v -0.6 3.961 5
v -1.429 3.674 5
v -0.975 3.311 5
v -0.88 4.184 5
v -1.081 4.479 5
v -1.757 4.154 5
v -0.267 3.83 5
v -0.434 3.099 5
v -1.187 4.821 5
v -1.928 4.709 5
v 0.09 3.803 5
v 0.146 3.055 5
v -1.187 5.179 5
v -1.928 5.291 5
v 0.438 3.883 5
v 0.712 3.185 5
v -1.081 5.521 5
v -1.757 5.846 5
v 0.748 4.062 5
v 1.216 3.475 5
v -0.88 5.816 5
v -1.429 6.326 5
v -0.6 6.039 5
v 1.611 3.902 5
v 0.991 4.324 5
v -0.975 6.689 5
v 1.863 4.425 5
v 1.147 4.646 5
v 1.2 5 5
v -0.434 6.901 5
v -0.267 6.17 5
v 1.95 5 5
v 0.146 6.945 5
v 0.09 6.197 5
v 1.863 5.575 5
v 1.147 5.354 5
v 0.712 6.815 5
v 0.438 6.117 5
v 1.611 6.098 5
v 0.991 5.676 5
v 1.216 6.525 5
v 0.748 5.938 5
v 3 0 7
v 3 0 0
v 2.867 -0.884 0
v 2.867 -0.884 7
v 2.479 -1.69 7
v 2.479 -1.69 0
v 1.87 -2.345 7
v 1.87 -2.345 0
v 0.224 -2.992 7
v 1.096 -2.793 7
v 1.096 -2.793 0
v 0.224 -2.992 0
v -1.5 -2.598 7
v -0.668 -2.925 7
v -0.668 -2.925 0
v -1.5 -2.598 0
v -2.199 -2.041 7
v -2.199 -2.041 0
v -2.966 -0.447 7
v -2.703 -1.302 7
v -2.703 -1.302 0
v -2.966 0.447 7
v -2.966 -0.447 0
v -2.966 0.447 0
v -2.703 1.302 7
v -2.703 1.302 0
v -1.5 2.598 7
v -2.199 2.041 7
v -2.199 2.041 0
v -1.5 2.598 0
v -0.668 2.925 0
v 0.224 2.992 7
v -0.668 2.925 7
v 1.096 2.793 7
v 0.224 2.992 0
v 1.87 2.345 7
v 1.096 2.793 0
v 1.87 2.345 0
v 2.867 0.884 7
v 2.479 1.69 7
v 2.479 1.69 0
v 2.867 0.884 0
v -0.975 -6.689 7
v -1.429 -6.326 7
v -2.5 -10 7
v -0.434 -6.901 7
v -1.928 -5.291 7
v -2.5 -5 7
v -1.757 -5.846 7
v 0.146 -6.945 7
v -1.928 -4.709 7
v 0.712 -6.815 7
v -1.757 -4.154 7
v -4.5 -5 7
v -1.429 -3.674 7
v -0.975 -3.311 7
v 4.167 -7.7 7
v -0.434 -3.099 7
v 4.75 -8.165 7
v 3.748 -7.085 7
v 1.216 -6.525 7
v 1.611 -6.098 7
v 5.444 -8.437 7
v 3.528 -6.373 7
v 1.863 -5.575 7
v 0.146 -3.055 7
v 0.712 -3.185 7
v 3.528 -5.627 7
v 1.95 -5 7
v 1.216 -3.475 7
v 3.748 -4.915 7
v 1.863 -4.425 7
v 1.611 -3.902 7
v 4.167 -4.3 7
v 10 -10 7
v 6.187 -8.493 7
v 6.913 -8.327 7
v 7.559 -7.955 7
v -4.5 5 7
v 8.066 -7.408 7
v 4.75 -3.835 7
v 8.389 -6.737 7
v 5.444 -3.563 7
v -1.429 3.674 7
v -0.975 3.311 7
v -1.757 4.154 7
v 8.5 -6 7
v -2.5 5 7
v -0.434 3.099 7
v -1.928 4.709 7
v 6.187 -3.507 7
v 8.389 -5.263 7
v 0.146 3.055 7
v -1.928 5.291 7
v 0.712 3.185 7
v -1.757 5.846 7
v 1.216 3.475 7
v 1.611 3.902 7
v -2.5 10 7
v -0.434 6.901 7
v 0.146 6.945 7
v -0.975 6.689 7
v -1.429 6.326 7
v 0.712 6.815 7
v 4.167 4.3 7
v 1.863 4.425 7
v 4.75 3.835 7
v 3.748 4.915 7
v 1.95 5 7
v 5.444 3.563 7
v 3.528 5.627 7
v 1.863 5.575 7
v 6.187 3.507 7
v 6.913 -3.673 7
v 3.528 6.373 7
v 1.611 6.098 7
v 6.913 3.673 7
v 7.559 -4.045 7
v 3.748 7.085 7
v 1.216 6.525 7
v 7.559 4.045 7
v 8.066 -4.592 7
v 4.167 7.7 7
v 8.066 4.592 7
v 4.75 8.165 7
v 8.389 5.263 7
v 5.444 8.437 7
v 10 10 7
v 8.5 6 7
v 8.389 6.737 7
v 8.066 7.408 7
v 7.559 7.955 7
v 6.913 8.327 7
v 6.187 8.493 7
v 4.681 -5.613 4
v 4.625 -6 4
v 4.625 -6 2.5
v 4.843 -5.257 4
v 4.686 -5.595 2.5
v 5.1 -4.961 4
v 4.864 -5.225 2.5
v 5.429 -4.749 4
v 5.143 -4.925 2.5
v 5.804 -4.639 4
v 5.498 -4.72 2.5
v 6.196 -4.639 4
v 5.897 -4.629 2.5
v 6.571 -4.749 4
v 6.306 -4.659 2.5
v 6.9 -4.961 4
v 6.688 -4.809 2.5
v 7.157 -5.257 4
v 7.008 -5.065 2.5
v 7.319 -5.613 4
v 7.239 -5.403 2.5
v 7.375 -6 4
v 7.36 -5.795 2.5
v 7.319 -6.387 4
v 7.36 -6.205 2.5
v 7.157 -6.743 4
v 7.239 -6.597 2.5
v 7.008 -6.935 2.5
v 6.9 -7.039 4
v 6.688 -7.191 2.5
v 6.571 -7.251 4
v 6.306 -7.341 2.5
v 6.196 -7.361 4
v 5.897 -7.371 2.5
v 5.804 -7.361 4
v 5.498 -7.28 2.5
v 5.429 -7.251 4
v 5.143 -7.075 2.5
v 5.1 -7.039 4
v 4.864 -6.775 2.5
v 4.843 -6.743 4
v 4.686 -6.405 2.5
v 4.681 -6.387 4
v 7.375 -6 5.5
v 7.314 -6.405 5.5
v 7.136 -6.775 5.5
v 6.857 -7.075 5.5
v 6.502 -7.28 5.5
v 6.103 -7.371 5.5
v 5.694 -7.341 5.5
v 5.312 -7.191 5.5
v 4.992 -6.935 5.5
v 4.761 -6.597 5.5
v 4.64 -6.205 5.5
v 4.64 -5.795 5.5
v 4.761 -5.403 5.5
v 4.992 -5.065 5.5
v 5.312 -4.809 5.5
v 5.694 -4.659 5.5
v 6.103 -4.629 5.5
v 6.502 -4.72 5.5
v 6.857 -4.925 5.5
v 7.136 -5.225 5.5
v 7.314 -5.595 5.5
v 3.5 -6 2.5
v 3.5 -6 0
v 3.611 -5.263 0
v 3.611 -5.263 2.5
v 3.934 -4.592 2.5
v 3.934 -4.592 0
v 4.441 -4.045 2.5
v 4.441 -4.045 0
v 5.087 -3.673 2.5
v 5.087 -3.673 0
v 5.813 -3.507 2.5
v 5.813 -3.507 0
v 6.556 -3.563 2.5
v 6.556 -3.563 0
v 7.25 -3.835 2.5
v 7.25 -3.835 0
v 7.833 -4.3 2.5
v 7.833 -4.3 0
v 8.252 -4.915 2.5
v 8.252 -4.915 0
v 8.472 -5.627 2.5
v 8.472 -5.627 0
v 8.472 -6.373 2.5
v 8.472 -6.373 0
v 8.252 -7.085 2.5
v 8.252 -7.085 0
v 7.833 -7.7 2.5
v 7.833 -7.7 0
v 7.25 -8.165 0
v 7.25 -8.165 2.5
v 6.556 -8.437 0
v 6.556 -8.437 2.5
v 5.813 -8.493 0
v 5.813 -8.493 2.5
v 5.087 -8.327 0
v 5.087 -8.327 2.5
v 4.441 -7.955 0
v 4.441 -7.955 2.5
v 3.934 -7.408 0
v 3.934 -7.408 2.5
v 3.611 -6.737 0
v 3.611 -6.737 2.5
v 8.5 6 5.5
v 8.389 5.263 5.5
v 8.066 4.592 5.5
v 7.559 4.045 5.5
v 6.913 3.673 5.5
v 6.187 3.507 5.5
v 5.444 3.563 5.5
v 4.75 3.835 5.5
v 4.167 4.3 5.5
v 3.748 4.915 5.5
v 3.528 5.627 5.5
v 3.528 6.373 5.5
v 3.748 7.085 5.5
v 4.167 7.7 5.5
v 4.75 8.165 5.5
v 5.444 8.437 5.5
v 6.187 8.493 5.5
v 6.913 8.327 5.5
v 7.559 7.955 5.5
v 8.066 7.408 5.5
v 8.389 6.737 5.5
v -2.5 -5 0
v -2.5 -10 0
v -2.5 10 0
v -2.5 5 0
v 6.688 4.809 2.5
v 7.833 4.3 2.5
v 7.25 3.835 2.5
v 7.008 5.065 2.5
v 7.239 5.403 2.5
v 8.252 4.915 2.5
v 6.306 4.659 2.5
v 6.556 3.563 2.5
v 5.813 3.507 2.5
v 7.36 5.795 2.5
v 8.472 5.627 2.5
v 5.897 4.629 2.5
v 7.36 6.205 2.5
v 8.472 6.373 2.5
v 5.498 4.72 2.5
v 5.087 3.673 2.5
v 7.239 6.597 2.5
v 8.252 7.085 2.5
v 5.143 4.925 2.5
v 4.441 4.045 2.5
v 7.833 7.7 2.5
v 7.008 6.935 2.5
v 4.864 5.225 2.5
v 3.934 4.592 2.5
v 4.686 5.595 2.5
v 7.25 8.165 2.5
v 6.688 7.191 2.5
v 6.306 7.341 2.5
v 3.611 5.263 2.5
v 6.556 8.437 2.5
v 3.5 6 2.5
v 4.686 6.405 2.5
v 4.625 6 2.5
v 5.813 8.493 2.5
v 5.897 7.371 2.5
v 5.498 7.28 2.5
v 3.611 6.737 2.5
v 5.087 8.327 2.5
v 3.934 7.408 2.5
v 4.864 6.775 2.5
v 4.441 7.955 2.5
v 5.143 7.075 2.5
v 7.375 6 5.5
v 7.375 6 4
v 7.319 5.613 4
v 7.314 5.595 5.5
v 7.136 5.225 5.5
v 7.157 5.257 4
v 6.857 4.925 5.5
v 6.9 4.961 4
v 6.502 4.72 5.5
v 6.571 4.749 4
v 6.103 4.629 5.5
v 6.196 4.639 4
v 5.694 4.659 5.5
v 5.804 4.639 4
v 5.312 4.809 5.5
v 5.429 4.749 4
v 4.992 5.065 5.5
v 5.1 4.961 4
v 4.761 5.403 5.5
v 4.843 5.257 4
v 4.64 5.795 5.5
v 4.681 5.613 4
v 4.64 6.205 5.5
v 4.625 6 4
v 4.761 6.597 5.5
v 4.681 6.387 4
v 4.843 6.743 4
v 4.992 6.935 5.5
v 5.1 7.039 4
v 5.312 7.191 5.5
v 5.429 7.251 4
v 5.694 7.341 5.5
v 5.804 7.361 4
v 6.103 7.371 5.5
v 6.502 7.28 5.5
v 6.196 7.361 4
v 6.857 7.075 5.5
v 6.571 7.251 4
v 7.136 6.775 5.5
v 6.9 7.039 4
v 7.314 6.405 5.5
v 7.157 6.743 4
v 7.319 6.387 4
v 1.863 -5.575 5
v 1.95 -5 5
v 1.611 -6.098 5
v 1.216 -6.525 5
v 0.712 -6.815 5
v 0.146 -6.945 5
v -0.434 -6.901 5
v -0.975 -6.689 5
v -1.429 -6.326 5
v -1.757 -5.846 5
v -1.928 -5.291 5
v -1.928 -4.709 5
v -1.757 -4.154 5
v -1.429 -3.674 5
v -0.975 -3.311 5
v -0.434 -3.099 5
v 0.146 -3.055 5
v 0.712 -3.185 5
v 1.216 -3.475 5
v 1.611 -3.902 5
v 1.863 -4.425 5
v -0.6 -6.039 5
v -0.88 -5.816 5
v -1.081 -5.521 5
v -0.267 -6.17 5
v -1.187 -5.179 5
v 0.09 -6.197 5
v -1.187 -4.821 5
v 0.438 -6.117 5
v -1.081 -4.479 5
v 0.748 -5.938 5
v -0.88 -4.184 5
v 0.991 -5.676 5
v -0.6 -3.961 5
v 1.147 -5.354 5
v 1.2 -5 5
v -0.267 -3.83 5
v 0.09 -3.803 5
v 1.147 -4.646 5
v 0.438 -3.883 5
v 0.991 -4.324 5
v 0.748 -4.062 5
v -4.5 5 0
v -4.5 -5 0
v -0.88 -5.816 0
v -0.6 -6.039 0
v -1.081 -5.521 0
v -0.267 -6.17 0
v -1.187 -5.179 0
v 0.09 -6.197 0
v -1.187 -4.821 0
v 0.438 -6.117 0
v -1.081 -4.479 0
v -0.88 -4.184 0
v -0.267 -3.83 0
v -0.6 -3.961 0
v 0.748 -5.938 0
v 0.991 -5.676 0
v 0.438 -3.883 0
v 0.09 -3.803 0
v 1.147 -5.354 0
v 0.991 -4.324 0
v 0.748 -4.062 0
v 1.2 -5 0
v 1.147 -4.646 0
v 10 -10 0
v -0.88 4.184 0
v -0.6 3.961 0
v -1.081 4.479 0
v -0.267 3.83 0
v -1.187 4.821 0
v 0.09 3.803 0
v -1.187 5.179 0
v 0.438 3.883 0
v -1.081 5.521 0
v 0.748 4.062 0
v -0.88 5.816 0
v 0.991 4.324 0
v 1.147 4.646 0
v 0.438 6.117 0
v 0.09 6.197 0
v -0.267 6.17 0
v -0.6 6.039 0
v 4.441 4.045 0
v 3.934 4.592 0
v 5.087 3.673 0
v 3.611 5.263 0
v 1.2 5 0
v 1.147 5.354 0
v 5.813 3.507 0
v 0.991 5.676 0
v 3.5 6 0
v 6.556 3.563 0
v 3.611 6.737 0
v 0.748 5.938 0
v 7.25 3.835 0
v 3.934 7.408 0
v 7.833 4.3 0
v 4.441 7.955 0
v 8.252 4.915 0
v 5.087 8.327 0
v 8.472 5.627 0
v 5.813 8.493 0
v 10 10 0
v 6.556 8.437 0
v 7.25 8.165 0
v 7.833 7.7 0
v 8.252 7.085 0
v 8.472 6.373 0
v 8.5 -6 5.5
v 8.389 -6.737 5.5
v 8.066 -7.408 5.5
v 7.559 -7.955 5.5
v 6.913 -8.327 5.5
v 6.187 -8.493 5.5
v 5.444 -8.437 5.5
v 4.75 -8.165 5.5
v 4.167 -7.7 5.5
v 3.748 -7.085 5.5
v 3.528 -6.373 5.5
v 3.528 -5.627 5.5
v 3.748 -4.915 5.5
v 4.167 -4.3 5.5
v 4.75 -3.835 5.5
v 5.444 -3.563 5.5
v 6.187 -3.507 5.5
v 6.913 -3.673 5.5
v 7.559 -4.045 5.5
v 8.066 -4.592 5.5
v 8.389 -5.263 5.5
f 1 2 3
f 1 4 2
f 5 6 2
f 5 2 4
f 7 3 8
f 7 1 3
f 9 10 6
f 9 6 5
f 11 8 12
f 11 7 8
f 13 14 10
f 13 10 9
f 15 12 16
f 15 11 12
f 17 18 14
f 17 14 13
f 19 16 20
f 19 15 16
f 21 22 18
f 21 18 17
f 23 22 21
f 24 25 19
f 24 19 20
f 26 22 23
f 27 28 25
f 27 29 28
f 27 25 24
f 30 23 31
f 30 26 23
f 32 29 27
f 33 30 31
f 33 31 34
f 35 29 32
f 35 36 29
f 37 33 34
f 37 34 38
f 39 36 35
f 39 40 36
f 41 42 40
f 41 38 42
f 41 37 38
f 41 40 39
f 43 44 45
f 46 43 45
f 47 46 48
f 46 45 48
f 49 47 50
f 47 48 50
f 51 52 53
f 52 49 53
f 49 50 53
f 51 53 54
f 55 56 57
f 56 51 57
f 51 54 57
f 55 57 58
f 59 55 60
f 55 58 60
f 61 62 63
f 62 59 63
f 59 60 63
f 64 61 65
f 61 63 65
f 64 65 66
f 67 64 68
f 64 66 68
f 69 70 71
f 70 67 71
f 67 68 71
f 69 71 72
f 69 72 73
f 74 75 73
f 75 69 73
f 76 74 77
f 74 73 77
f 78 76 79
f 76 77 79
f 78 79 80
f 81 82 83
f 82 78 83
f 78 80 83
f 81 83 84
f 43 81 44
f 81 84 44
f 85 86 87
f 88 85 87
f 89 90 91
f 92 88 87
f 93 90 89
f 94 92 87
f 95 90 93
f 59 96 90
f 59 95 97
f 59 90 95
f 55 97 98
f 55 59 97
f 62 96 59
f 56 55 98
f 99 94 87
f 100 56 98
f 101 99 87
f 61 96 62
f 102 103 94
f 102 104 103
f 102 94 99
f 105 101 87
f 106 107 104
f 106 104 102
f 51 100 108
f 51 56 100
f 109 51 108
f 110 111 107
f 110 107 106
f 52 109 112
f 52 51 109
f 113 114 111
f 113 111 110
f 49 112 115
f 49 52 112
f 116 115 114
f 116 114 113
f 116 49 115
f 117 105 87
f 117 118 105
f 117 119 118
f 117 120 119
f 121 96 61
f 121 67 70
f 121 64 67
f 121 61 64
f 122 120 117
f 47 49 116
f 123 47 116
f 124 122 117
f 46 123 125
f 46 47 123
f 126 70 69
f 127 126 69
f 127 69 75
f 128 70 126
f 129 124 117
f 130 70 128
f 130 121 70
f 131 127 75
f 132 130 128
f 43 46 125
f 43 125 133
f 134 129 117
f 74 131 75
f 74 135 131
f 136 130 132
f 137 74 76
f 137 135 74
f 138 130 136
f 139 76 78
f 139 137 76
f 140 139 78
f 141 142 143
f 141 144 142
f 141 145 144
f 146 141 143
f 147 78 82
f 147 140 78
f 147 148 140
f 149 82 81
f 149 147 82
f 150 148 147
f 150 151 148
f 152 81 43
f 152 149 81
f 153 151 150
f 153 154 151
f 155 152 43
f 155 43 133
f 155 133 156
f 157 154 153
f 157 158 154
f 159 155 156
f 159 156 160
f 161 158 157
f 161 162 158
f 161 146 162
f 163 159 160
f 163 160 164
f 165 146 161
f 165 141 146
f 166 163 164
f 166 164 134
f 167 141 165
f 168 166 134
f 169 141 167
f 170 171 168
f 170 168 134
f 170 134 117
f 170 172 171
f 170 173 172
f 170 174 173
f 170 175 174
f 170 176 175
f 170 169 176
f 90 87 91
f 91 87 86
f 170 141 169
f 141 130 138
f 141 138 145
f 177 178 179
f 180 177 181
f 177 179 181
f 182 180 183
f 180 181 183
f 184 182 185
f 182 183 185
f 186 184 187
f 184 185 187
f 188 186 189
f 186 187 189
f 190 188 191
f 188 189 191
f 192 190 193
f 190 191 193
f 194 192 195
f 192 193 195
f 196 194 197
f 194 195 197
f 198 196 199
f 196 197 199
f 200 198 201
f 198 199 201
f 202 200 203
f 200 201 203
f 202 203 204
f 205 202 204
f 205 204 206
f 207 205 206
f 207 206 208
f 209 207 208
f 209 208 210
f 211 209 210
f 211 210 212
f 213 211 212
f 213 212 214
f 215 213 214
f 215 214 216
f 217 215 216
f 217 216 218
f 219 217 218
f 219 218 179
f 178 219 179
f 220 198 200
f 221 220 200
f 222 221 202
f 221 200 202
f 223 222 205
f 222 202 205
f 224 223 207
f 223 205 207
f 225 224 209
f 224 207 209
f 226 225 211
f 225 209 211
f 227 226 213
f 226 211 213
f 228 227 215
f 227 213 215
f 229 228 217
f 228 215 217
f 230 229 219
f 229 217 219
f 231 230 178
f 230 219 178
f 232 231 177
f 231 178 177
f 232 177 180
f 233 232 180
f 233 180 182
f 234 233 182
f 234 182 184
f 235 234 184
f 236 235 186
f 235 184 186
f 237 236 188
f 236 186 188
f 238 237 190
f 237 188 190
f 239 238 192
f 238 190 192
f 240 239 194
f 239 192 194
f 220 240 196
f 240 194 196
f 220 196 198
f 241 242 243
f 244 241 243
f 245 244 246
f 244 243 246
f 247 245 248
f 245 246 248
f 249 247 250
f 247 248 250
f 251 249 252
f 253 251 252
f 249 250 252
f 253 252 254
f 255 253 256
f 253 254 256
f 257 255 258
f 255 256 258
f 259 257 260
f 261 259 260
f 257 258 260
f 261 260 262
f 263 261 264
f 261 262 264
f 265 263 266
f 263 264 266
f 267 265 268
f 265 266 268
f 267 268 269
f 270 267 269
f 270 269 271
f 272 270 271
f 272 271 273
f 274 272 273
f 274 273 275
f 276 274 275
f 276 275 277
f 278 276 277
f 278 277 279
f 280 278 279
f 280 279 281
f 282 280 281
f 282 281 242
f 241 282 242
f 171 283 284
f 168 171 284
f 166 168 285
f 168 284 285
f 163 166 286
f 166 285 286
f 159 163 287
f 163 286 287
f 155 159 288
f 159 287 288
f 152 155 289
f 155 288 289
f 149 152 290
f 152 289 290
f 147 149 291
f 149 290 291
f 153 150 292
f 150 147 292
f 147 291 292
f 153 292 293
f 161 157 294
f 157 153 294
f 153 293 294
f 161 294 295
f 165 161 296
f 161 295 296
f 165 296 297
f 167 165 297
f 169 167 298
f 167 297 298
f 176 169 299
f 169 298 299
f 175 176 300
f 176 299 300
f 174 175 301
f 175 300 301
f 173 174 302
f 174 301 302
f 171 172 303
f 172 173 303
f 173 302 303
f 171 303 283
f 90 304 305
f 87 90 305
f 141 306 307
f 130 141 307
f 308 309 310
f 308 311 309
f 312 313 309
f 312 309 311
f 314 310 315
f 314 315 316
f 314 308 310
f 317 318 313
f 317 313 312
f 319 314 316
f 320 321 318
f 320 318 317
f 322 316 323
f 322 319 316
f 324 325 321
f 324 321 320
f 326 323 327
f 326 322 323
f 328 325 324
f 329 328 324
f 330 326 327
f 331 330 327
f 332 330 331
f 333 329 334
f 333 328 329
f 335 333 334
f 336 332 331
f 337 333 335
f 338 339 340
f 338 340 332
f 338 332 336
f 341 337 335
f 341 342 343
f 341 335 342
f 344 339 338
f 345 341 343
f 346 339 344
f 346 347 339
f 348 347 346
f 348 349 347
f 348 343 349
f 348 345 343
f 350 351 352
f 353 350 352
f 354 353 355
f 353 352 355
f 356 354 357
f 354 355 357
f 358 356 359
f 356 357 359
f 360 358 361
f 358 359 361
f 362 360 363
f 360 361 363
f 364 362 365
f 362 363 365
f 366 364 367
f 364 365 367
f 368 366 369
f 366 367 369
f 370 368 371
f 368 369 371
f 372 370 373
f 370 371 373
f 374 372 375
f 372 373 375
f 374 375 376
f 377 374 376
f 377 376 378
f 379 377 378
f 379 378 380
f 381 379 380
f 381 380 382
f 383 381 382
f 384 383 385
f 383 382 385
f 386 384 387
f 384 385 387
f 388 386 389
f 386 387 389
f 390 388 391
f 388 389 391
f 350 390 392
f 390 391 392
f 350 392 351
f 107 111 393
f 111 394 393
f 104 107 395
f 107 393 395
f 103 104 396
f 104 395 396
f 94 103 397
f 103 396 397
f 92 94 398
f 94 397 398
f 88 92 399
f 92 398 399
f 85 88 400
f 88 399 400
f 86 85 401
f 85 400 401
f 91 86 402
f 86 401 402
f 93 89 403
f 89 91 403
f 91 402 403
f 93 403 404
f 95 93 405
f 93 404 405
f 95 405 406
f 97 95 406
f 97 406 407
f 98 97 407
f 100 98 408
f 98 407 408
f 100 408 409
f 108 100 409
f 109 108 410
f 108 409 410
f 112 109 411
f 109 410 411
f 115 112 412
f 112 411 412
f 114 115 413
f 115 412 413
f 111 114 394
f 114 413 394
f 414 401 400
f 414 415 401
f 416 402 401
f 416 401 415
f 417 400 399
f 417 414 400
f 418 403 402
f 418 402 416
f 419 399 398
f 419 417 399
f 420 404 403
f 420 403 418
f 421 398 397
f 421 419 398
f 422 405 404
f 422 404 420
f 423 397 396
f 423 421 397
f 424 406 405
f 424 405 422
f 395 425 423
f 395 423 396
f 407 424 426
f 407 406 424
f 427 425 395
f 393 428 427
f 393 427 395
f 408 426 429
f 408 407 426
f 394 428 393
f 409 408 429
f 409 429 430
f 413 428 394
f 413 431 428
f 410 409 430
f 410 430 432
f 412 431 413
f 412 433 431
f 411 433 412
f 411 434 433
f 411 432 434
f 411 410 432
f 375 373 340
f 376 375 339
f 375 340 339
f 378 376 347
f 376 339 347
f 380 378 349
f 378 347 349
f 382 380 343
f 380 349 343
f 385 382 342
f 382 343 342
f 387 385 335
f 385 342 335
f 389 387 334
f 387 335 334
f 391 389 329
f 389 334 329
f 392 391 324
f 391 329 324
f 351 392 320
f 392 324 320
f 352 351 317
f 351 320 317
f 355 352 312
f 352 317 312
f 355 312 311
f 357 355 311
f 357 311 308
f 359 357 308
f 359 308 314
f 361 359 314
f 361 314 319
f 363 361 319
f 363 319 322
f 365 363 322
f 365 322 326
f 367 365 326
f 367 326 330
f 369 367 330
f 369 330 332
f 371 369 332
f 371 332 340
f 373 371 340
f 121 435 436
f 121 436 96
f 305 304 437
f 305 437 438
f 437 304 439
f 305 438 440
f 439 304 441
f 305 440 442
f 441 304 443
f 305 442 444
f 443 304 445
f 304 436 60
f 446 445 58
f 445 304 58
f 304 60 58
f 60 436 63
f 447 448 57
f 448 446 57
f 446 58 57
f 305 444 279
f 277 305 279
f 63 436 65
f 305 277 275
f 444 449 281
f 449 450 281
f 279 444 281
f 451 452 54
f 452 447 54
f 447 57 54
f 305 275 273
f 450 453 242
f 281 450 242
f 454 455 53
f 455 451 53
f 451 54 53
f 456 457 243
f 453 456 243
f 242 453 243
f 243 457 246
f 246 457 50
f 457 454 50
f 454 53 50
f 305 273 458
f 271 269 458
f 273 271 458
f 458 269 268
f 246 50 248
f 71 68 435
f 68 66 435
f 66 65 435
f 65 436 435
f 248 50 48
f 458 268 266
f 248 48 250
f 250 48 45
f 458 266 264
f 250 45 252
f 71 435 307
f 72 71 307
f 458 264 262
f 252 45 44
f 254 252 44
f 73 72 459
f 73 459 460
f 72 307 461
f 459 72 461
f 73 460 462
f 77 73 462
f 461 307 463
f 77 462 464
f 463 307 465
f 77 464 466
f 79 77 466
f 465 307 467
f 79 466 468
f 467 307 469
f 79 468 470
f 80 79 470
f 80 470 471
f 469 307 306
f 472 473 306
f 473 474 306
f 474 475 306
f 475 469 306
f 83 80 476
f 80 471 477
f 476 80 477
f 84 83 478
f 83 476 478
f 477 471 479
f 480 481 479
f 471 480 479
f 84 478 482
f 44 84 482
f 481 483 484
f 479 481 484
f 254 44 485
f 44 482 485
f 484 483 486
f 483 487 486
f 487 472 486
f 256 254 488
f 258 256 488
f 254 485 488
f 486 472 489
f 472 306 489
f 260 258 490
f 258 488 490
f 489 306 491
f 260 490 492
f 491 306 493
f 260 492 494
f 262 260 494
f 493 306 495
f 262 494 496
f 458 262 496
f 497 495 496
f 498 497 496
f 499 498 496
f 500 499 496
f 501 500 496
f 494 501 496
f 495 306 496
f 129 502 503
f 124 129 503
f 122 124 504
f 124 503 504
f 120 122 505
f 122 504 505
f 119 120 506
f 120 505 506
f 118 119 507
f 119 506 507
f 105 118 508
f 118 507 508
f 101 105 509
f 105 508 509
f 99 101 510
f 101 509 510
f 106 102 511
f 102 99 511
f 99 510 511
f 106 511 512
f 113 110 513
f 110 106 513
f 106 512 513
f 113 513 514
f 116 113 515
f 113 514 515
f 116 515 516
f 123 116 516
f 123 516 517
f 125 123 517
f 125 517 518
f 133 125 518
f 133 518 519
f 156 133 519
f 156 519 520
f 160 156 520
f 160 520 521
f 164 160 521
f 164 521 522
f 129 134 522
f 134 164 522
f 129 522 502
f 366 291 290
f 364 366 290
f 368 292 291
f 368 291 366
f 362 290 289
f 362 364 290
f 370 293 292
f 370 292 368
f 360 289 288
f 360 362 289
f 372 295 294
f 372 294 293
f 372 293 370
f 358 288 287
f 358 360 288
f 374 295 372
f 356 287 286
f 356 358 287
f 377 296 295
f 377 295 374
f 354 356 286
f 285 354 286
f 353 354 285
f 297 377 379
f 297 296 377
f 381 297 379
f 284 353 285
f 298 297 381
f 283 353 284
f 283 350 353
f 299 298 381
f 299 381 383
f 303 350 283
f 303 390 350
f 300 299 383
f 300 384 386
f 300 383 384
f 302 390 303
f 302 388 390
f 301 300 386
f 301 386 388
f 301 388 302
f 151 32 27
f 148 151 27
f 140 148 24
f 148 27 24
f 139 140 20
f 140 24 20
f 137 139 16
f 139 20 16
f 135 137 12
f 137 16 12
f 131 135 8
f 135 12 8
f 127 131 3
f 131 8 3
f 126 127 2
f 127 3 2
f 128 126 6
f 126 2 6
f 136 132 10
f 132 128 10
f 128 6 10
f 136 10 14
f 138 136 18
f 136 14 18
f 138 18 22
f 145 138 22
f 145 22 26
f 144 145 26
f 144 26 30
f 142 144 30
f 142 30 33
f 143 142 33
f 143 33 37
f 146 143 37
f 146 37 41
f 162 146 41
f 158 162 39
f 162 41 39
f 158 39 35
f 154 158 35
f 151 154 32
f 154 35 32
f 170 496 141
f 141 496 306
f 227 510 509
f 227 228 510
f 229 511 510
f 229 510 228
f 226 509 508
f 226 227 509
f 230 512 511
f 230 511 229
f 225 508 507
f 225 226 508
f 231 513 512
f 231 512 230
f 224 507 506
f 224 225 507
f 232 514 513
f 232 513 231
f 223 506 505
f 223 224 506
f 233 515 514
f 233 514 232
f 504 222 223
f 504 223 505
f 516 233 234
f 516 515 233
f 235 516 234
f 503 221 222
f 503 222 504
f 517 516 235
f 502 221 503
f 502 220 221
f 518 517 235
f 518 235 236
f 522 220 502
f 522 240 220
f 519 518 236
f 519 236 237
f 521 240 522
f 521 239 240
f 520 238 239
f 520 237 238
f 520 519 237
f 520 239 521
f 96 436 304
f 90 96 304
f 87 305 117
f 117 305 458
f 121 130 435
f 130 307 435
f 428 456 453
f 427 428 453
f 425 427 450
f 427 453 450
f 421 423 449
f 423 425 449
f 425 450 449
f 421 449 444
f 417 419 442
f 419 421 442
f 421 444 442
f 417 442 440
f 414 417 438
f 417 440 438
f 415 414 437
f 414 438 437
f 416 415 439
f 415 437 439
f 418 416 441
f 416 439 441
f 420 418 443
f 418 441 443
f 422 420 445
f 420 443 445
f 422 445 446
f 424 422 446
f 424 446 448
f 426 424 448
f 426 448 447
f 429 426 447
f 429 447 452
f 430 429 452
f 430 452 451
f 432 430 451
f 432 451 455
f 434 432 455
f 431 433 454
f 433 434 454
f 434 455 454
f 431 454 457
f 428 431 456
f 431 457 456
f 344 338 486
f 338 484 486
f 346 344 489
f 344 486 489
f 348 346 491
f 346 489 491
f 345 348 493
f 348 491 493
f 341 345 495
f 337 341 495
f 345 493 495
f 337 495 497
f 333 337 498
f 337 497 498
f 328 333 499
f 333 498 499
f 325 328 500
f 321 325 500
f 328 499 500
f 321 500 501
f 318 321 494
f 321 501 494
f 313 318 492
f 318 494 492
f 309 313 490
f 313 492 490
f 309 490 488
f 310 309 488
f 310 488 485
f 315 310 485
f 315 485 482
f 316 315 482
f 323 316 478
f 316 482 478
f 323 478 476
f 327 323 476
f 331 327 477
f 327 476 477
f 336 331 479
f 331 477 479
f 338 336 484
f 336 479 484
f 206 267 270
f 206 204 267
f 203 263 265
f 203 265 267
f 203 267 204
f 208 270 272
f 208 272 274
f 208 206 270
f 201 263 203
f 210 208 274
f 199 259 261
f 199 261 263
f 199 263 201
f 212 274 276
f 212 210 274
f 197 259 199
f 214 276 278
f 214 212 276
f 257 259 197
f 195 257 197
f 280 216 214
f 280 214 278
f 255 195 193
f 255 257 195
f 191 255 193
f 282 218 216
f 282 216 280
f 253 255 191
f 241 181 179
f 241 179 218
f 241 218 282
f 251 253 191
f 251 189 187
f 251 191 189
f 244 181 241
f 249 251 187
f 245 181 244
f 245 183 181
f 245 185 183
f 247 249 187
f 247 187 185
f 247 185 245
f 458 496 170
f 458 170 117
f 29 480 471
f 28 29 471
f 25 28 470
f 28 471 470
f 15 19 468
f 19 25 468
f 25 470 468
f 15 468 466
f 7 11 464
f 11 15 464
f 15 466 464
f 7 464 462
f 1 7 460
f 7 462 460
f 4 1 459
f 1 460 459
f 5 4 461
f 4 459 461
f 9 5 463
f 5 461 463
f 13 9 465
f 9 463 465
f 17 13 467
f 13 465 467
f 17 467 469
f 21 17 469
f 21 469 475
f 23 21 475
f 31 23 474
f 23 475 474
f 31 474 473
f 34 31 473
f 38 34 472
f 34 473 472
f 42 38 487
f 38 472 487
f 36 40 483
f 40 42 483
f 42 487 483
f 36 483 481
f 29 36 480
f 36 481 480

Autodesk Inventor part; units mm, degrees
ref_plane "YZ Plane" through (0, 0, 0) normal (1, 0, 0) x (0, 1, 0)
ref_plane "XZ Plane" through (0, 0, 0) normal (0, 1, 0) x (-1, 0, 0)
ref_plane "XY Plane" through (0, 0, 0) normal (0, 0, 1) x (1, 0, 0)
sketch "Sketch1" plane through (0, 0, 0) normal (0, 0, 1) x (1, 0, 0)
  line L0 (10, -10) -> (-10, -10)
  line L1 (-10, -10) -> (-10, 10)
  line L2 (-10, 10) -> (10, 10)
  line L3 (10, 10) -> (10, -10)
  circle A0 centre (0, 5) radius 1.2
  circle A1 centre (0, -5) radius 1.2
  circle A2 centre (0, 0) radius 3
  dimension "d0" = 10
  dimension "d1" = 10
  dimension "d2" = 10
  dimension "d3" = 10
  dimension "d4" = 5
  dimension "d5" = 5
  dimension "d6" = 2.4
  dimension "d7" = 2.4
  dimension "d8" = 6
extrude "Extrusion1" add sketch "Sketch1" along normal blind 5
sketch "Sketch2" plane through (0, 0, 5) normal (0, 0, 1) x (1, 0, 0)
  line L0 (0, 0) -> (-1.3346, -1.3533)
  circle A0 centre (6, -6) radius 2.5
  circle A1 centre (6, 6) radius 2.5
  line L1 (10, -10) -> (10, 10) projected
  line L2 (-10, -10) -> (10, -10) projected
  line L3 (10, 10) -> (-10, 10) projected
  dimension "d34" = 4
  dimension "d35" = 4
  dimension "d36" = 4
  dimension "d37" = 4
  dimension "d38" = 5
  dimension "d39" = 5
extrude "Extrusion2" cut sketch "Sketch2" against normal blind 1
sketch "Sketch7" plane through (0, 0, 0) normal (0, 0, -1) x (-1, 0, 0)
  circle A0 centre (-6, 6) radius 2.5 projected
  circle A1 centre (-6, 6) radius 1.375
  circle A2 centre (-6, -6) radius 2.5 projected
  circle A3 centre (-6, -6) radius 1.375
  point P0 (0, 0)
  dimension "d40" = 2.75
  dimension "d41" = 2.75
extrude "Extrusion6" cut sketch "Sketch7" against normal blind 5 contours A1 | A3
sketch "Sketch8" plane through (0, 0, 5) normal (0, 0, 1) x (1, 0, 0)
  line L0 (10, 10) -> (-10, 10) projected
  line L1 (10, 10) -> (2.5, 10)
  line L2 (2.5, 10) -> (2.5, 2.5)
  line L3 (2.5, 2.5) -> (10, 2.5)
  line L4 (10, 2.5) -> (10, 10)
  line L5 (10, -10) -> (10, 10) projected
  line L6 (10, -10) -> (2.5, -10)
  line L7 (2.5, -10) -> (2.5, -2.5)
  line L8 (2.5, -2.5) -> (10, -2.5)
  line L9 (10, -2.5) -> (10, -10)
  line L10 (10, -2.5) -> (5, -2.5)
  line L11 (5, -2.5) -> (5, 2.5)
  line L12 (5, 2.5) -> (10, 2.5)
  line L13 (10, 2.5) -> (10, -2.5)
  circle A0 centre (6, 6) radius 2.5 projected
  circle A1 centre (6, 6) radius 2.5
  circle A2 centre (6, -6) radius 2.5 projected
  circle A3 centre (6, -6) radius 2.5
  point P0 (0, 0)
  point P1 (2.5, 10)
  dimension "d44" = 7.5
  dimension "d45" = 7.5
  dimension "d46" = 7.5
  dimension "d47" = 7.5
  dimension "d48" = 5
extrude "Extrusion7" add sketch "Sketch8" along normal blind 2
sketch "Sketch9" plane through (0, 0, 0) normal (0, 0, -1) x (-1, 0, 0)
  circle A0 centre (-6, 6) radius 1.375 projected
  circle A1 centre (-6, 6) radius 2.5
  circle A2 centre (-6, -6) radius 1.375 projected
  circle A3 centre (-6, -6) radius 2.5
  point P0 (0, 0)
  dimension "d51" = 5
  dimension "d52" = 5
extrude "Extrusion8" cut sketch "Sketch9" against normal blind 2.5 contours A0 | A1 | A2 | A3
sketch "Sketch10" plane through (0, 0, 0) normal (0, 0, -1) x (-1, 0, 0)
  line L0 (-2.5, 10) -> (10, 10) projected
  line L1 (10, -10) -> (-2.5, -10) projected
  line L2 (10, 10) -> (5, 10)
  line L3 (5, 10) -> (5, -10)
  line L4 (5, -10) -> (10, -10)
  line L5 (10, -10) -> (10, 10)
  line L6 (5, 10) -> (2.5, 10)
  line L7 (2.5, 10) -> (2.5, 5)
  line L8 (2.5, 5) -> (5, 5)
  line L9 (5, 5) -> (5, 10)
  line L10 (5, -10) -> (2.5, -10)
  line L11 (2.5, -10) -> (2.5, -5)
  line L12 (2.5, -5) -> (5, -5)
  line L13 (5, -5) -> (5, -10)
  point P0 (0, 0)
  point P1 (2.5, 10)
  dimension "d55" = 5
  dimension "d56" = 2.5
  dimension "d57" = 5
  dimension "d58" = 5
  dimension "d59" = 2.5
extrude "Extrusion9" cut sketch "Sketch10" against normal blind 10
sketch "Sketch12" plane through (6, -6, 4) normal (0, 0, 1) x (1, 0, 0)
  circle A0 centre (0, 0) radius 1.375 projected
  circle A1 centre (0, 0) radius 2.5 projected
  circle A2 centre (0, 12) radius 2.5 projected
  circle A3 centre (0, 12) radius 1.375 projected
  circle A4 centre (0, 12) radius 2.5 projected
  point P0 (-6, 6)
extrude "Extrusion11" add sketch "Sketch12" along normal blind 1.5
sketch "Sketch13" plane through (0, 0, 5) normal (0, 0, 1) x (1, 0, 0)
  point P0 (0, 0)
sketch "Sketch14" plane through (0, 0, 5) normal (0, 0, 1) x (1, 0, 0)
  line L0 (-2.5, -5) -> (-2.5, -10) projected
  line L1 (-2.5, -10) -> (2.5, -10) projected
  line L2 (2.5, -10) -> (2.5, -2.5) projected
  line L3 (2.5, -2.5) -> (5, -2.5) projected
  line L4 (5, -2.5) -> (5, 2.5) projected
  line L5 (5, 2.5) -> (2.5, 2.5) projected
  line L6 (2.5, 2.5) -> (2.5, 10) projected
  line L7 (2.5, 10) -> (-2.5, 10) projected
  line L8 (-2.5, 10) -> (-2.5, 5) projected
  line L9 (-2.5, 5) -> (-5, 5) projected
  line L10 (-5, 5) -> (-5, -5) projected
  line L11 (-5, -5) -> (-2.5, -5) projected
  circle A0 centre (0, 0) radius 3 projected
  circle A1 centre (0, -5) radius 1.2 projected
  circle A2 centre (0, 5) radius 1.2 projected
  circle A3 centre (0, -5) radius 1.95
  circle A4 centre (0, 5) radius 1.95
  dimension "d80" = 3.9
  dimension "d81" = 3.9
extrude "Extrusion12" add sketch "Sketch14" along normal blind 2 contours L11 L10 L9 L8 L7 L6 L5 L4 L3 L2 L1 L0
sketch "Sketch15" plane through (-5, -5, 0) normal (-1, 0, 0) x (0, 0, 1)
  line L0 (0, 10) -> (7, 10) projected
  line L1 (0, 0) -> (0, 10) projected
  line L2 (0, 0) -> (7, 0) projected
  line L3 (7, 10) -> (7, 0) projected
  point P0 (0, 5)
extrude "Extrusion13" cut sketch "Sketch15" against normal blind 0.5
equation "\"d1\" = d0"
equation "\"d2\" = d0"
equation "\"d3\" = d2"
equation "\"d5\" = d4"
equation "\"d7\" = d6"
equation "\"d39\" = d38"
equation "\"d45\" = d44"
equation "\"d46\" = d45"
equation "\"d52\" = d51"
equation "\"d81\" = d80"
properties part number "MotorMount" material "Stainless Steel"
